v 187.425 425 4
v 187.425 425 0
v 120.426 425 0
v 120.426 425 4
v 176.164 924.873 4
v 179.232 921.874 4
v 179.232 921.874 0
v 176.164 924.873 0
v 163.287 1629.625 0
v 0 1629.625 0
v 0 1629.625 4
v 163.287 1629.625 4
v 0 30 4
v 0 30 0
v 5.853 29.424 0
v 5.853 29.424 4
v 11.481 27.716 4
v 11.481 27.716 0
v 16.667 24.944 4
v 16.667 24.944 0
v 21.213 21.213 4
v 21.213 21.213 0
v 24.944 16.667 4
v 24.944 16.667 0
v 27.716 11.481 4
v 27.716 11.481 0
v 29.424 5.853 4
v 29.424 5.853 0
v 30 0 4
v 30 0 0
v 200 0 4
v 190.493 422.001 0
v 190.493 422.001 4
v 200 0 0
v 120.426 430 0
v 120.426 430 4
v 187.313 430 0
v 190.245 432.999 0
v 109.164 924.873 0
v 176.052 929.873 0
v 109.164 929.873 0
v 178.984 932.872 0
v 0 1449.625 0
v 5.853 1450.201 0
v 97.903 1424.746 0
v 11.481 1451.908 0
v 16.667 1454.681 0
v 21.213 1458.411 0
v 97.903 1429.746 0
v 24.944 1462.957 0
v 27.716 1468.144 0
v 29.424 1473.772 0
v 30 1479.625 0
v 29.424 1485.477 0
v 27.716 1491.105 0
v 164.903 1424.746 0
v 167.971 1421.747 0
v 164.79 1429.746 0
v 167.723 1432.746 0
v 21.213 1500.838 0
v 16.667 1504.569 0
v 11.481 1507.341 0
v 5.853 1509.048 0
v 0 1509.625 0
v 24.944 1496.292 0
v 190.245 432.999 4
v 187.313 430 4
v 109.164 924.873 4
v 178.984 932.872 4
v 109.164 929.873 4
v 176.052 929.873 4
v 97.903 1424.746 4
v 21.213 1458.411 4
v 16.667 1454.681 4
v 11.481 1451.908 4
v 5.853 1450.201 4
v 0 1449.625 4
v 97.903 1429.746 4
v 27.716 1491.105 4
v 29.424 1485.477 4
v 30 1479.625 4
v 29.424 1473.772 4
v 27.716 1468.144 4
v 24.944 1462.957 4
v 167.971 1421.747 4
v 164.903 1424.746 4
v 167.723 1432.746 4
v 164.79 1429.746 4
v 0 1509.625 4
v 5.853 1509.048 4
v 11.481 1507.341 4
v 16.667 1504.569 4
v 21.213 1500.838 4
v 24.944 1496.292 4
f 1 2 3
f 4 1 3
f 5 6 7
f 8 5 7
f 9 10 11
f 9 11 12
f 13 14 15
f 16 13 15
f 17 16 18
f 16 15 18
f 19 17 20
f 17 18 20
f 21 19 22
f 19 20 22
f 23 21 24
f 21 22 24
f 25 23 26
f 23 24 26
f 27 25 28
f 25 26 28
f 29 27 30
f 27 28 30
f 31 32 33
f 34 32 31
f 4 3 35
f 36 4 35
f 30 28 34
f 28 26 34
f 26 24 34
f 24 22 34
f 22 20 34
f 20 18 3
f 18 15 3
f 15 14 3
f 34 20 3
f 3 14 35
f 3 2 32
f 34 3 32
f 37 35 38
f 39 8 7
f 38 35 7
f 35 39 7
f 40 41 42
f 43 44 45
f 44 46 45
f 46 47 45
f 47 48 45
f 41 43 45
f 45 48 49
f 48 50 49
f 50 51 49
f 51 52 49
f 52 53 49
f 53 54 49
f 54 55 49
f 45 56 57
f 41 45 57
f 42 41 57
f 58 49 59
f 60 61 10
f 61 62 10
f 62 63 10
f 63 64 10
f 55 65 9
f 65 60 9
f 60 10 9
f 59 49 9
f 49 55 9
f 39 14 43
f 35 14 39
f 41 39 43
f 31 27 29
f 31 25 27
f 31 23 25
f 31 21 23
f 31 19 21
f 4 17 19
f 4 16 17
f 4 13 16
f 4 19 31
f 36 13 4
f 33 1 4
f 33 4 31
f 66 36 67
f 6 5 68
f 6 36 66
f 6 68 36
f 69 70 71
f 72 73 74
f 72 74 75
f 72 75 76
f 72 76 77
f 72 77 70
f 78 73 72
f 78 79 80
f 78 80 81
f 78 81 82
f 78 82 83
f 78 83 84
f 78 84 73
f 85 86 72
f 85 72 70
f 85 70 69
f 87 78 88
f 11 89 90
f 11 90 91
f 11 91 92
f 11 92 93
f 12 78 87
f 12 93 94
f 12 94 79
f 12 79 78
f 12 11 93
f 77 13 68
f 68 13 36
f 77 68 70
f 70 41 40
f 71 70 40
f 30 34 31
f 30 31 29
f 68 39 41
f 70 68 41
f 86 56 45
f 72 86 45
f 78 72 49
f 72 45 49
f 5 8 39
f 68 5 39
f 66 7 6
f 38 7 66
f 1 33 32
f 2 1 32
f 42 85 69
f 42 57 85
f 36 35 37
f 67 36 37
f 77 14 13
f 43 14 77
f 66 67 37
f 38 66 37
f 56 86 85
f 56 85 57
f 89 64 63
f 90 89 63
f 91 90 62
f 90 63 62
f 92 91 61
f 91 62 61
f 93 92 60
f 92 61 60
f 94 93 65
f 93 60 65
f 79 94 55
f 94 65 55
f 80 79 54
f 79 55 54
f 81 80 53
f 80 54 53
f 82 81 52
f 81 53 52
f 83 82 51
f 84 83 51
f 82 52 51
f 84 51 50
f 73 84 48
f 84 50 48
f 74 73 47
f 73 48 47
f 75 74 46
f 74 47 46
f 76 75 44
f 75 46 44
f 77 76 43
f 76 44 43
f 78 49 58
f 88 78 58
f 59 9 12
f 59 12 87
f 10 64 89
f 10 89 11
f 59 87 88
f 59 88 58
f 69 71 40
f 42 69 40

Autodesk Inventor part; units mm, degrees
ref_plane "YZ Plane" through (0, 0, 0) normal (1, 0, 0) x (0, 1, 0)
ref_plane "XZ Plane" through (0, 0, 0) normal (0, 1, 0) x (-1, 0, 0)
ref_plane "XY Plane" through (0, 0, 0) normal (0, 0, 1) x (1, 0, 0)
sketch "Sketch1" plane through (0, 0, 0) normal (0, 0, 1) x (1, 0, 0)
  line L0 (0, 0) -> (0, 4438.8737)
  line L1 (0, 4438.8737) -> (100, 4438.8737)
  line L2 (100, 4438.8737) -> (200, 0)
  line L3 (200, 0) -> (0, 0)
  circle A0 centre (0, 0) radius 30
  line L4 (0, 1479.6246) -> (166.6667, 1479.6246)
  line L5 (0, 2959.2492) -> (133.3333, 2959.2492)
  circle A1 centre (0, 1479.6246) radius 30
  circle A2 centre (0, 2959.2492) radius 30
  line L6 (190.4255, 425) -> (120.4255, 425)
  line L7 (120.4255, 425) -> (120.4255, 430)
  line L8 (120.4255, 430) -> (190.4255, 430)
  line L9 (190.4255, 430) -> (190.4255, 425)
  line L10 (109.1642, 929.8732) -> (179.1642, 929.8732)
  line L11 (179.1642, 924.8732) -> (109.1642, 924.8732)
  line L12 (109.1642, 924.8732) -> (109.1642, 929.8732)
  line L13 (179.1642, 929.8732) -> (179.1642, 924.8732)
  line L14 (97.903, 1429.7463) -> (167.903, 1429.7463)
  line L15 (167.903, 1424.7463) -> (97.903, 1424.7463)
  line L16 (97.903, 1424.7463) -> (97.903, 1429.7463)
  line L17 (167.903, 1429.7463) -> (167.903, 1424.7463)
  line L18 (86.6417, 1929.6195) -> (156.6417, 1929.6195)
  line L19 (156.6417, 1924.6195) -> (86.6417, 1924.6195)
  line L20 (86.6417, 1924.6195) -> (86.6417, 1929.6195)
  line L21 (156.6417, 1929.6195) -> (156.6417, 1924.6195)
  line L22 (75.3805, 2429.4927) -> (145.3805, 2429.4927)
  line L23 (145.3805, 2424.4927) -> (75.3805, 2424.4927)
  line L24 (75.3805, 2424.4927) -> (75.3805, 2429.4927)
  line L25 (145.3805, 2429.4927) -> (145.3805, 2424.4927)
  line L26 (64.1192, 2929.3658) -> (134.1192, 2929.3658)
  line L27 (134.1192, 2924.3658) -> (64.1192, 2924.3658)
  line L28 (64.1192, 2924.3658) -> (64.1192, 2929.3658)
  line L29 (134.1192, 2929.3658) -> (134.1192, 2924.3658)
  line L30 (52.8579, 3429.239) -> (122.8579, 3429.239)
  line L31 (122.8579, 3424.239) -> (52.8579, 3424.239)
  line L32 (52.8579, 3424.239) -> (52.8579, 3429.239)
  line L33 (122.8579, 3429.239) -> (122.8579, 3424.239)
  line L34 (41.5967, 3929.1122) -> (111.5967, 3929.1122)
  line L35 (111.5967, 3924.1122) -> (41.5967, 3924.1122)
  line L36 (41.5967, 3924.1122) -> (41.5967, 3929.1122)
  line L37 (111.5967, 3929.1122) -> (111.5967, 3924.1122)
  line L38 (0, 1629.6246) -> (163.2874, 1629.6246)
  line L39 (0, 3039.2492) -> (131.5311, 3039.2492)
  point P0 (30, 2959.2492)
  point P1 (0, 2929.2492)
  point P2 (0, 1509.6246)
  point P3 (0, 1449.6246)
  point P4 (0, 30)
  point P5 (30, 0)
  point P6 (190.3129, 430)
  point P7 (179.0516, 929.8732)
  point P8 (167.7903, 1429.7463)
  point P9 (30, 1479.6246)
  dimension "d65" = 100
  dimension "d67" = 200
  dimension "d68" = 60
  dimension "d69" = 1480
  dimension "d70" = 1480
  dimension "d71" = 1480
  dimension "d72" = 5
  dimension "d73" = 70
  dimension "d74" = 430
  dimension "d77" = 500
  dimension "d82" = 80
  dimension "d83" = 150
extrude "Plate3" add sketch "Sketch1" along normal blind 4 contours L38 L2 L4 A1 L0 | L4 L2 L14 L16 L15 L10 L12 L11 L8 L7 L6 L3 A0 L0 A1
chamfer "Corner Chamfer2" distance 3 angle 45 6 edges at (190.3129, 430, 2) (190.4255, 425, 2) (179.1642, 924.8732, 2) (179.0516, 929.8732, 2) (167.903, 1424.7463, 2) (167.7903, 1429.7463, 2)
equation "\"BendRadius\" = Thickness"
equation "\"BendReliefWidth\" = Thickness"
equation "\"BendReliefDepth\" = 0.5 * Thickness"
equation "\"CornerReliefSize\" = 4 * Thickness"
equation "\"MinimumRemnant\" = 2 * Thickness"
equation "\"TransitionRadius\" = BendRadius"
equation "\"JacobiRadiusSize\" = BendRadius"
equation "\"GapSize\" = Thickness"
equation "\"Thickness\" = 4"
properties part number "GBK 3101 Center main rib" material "Steel"
